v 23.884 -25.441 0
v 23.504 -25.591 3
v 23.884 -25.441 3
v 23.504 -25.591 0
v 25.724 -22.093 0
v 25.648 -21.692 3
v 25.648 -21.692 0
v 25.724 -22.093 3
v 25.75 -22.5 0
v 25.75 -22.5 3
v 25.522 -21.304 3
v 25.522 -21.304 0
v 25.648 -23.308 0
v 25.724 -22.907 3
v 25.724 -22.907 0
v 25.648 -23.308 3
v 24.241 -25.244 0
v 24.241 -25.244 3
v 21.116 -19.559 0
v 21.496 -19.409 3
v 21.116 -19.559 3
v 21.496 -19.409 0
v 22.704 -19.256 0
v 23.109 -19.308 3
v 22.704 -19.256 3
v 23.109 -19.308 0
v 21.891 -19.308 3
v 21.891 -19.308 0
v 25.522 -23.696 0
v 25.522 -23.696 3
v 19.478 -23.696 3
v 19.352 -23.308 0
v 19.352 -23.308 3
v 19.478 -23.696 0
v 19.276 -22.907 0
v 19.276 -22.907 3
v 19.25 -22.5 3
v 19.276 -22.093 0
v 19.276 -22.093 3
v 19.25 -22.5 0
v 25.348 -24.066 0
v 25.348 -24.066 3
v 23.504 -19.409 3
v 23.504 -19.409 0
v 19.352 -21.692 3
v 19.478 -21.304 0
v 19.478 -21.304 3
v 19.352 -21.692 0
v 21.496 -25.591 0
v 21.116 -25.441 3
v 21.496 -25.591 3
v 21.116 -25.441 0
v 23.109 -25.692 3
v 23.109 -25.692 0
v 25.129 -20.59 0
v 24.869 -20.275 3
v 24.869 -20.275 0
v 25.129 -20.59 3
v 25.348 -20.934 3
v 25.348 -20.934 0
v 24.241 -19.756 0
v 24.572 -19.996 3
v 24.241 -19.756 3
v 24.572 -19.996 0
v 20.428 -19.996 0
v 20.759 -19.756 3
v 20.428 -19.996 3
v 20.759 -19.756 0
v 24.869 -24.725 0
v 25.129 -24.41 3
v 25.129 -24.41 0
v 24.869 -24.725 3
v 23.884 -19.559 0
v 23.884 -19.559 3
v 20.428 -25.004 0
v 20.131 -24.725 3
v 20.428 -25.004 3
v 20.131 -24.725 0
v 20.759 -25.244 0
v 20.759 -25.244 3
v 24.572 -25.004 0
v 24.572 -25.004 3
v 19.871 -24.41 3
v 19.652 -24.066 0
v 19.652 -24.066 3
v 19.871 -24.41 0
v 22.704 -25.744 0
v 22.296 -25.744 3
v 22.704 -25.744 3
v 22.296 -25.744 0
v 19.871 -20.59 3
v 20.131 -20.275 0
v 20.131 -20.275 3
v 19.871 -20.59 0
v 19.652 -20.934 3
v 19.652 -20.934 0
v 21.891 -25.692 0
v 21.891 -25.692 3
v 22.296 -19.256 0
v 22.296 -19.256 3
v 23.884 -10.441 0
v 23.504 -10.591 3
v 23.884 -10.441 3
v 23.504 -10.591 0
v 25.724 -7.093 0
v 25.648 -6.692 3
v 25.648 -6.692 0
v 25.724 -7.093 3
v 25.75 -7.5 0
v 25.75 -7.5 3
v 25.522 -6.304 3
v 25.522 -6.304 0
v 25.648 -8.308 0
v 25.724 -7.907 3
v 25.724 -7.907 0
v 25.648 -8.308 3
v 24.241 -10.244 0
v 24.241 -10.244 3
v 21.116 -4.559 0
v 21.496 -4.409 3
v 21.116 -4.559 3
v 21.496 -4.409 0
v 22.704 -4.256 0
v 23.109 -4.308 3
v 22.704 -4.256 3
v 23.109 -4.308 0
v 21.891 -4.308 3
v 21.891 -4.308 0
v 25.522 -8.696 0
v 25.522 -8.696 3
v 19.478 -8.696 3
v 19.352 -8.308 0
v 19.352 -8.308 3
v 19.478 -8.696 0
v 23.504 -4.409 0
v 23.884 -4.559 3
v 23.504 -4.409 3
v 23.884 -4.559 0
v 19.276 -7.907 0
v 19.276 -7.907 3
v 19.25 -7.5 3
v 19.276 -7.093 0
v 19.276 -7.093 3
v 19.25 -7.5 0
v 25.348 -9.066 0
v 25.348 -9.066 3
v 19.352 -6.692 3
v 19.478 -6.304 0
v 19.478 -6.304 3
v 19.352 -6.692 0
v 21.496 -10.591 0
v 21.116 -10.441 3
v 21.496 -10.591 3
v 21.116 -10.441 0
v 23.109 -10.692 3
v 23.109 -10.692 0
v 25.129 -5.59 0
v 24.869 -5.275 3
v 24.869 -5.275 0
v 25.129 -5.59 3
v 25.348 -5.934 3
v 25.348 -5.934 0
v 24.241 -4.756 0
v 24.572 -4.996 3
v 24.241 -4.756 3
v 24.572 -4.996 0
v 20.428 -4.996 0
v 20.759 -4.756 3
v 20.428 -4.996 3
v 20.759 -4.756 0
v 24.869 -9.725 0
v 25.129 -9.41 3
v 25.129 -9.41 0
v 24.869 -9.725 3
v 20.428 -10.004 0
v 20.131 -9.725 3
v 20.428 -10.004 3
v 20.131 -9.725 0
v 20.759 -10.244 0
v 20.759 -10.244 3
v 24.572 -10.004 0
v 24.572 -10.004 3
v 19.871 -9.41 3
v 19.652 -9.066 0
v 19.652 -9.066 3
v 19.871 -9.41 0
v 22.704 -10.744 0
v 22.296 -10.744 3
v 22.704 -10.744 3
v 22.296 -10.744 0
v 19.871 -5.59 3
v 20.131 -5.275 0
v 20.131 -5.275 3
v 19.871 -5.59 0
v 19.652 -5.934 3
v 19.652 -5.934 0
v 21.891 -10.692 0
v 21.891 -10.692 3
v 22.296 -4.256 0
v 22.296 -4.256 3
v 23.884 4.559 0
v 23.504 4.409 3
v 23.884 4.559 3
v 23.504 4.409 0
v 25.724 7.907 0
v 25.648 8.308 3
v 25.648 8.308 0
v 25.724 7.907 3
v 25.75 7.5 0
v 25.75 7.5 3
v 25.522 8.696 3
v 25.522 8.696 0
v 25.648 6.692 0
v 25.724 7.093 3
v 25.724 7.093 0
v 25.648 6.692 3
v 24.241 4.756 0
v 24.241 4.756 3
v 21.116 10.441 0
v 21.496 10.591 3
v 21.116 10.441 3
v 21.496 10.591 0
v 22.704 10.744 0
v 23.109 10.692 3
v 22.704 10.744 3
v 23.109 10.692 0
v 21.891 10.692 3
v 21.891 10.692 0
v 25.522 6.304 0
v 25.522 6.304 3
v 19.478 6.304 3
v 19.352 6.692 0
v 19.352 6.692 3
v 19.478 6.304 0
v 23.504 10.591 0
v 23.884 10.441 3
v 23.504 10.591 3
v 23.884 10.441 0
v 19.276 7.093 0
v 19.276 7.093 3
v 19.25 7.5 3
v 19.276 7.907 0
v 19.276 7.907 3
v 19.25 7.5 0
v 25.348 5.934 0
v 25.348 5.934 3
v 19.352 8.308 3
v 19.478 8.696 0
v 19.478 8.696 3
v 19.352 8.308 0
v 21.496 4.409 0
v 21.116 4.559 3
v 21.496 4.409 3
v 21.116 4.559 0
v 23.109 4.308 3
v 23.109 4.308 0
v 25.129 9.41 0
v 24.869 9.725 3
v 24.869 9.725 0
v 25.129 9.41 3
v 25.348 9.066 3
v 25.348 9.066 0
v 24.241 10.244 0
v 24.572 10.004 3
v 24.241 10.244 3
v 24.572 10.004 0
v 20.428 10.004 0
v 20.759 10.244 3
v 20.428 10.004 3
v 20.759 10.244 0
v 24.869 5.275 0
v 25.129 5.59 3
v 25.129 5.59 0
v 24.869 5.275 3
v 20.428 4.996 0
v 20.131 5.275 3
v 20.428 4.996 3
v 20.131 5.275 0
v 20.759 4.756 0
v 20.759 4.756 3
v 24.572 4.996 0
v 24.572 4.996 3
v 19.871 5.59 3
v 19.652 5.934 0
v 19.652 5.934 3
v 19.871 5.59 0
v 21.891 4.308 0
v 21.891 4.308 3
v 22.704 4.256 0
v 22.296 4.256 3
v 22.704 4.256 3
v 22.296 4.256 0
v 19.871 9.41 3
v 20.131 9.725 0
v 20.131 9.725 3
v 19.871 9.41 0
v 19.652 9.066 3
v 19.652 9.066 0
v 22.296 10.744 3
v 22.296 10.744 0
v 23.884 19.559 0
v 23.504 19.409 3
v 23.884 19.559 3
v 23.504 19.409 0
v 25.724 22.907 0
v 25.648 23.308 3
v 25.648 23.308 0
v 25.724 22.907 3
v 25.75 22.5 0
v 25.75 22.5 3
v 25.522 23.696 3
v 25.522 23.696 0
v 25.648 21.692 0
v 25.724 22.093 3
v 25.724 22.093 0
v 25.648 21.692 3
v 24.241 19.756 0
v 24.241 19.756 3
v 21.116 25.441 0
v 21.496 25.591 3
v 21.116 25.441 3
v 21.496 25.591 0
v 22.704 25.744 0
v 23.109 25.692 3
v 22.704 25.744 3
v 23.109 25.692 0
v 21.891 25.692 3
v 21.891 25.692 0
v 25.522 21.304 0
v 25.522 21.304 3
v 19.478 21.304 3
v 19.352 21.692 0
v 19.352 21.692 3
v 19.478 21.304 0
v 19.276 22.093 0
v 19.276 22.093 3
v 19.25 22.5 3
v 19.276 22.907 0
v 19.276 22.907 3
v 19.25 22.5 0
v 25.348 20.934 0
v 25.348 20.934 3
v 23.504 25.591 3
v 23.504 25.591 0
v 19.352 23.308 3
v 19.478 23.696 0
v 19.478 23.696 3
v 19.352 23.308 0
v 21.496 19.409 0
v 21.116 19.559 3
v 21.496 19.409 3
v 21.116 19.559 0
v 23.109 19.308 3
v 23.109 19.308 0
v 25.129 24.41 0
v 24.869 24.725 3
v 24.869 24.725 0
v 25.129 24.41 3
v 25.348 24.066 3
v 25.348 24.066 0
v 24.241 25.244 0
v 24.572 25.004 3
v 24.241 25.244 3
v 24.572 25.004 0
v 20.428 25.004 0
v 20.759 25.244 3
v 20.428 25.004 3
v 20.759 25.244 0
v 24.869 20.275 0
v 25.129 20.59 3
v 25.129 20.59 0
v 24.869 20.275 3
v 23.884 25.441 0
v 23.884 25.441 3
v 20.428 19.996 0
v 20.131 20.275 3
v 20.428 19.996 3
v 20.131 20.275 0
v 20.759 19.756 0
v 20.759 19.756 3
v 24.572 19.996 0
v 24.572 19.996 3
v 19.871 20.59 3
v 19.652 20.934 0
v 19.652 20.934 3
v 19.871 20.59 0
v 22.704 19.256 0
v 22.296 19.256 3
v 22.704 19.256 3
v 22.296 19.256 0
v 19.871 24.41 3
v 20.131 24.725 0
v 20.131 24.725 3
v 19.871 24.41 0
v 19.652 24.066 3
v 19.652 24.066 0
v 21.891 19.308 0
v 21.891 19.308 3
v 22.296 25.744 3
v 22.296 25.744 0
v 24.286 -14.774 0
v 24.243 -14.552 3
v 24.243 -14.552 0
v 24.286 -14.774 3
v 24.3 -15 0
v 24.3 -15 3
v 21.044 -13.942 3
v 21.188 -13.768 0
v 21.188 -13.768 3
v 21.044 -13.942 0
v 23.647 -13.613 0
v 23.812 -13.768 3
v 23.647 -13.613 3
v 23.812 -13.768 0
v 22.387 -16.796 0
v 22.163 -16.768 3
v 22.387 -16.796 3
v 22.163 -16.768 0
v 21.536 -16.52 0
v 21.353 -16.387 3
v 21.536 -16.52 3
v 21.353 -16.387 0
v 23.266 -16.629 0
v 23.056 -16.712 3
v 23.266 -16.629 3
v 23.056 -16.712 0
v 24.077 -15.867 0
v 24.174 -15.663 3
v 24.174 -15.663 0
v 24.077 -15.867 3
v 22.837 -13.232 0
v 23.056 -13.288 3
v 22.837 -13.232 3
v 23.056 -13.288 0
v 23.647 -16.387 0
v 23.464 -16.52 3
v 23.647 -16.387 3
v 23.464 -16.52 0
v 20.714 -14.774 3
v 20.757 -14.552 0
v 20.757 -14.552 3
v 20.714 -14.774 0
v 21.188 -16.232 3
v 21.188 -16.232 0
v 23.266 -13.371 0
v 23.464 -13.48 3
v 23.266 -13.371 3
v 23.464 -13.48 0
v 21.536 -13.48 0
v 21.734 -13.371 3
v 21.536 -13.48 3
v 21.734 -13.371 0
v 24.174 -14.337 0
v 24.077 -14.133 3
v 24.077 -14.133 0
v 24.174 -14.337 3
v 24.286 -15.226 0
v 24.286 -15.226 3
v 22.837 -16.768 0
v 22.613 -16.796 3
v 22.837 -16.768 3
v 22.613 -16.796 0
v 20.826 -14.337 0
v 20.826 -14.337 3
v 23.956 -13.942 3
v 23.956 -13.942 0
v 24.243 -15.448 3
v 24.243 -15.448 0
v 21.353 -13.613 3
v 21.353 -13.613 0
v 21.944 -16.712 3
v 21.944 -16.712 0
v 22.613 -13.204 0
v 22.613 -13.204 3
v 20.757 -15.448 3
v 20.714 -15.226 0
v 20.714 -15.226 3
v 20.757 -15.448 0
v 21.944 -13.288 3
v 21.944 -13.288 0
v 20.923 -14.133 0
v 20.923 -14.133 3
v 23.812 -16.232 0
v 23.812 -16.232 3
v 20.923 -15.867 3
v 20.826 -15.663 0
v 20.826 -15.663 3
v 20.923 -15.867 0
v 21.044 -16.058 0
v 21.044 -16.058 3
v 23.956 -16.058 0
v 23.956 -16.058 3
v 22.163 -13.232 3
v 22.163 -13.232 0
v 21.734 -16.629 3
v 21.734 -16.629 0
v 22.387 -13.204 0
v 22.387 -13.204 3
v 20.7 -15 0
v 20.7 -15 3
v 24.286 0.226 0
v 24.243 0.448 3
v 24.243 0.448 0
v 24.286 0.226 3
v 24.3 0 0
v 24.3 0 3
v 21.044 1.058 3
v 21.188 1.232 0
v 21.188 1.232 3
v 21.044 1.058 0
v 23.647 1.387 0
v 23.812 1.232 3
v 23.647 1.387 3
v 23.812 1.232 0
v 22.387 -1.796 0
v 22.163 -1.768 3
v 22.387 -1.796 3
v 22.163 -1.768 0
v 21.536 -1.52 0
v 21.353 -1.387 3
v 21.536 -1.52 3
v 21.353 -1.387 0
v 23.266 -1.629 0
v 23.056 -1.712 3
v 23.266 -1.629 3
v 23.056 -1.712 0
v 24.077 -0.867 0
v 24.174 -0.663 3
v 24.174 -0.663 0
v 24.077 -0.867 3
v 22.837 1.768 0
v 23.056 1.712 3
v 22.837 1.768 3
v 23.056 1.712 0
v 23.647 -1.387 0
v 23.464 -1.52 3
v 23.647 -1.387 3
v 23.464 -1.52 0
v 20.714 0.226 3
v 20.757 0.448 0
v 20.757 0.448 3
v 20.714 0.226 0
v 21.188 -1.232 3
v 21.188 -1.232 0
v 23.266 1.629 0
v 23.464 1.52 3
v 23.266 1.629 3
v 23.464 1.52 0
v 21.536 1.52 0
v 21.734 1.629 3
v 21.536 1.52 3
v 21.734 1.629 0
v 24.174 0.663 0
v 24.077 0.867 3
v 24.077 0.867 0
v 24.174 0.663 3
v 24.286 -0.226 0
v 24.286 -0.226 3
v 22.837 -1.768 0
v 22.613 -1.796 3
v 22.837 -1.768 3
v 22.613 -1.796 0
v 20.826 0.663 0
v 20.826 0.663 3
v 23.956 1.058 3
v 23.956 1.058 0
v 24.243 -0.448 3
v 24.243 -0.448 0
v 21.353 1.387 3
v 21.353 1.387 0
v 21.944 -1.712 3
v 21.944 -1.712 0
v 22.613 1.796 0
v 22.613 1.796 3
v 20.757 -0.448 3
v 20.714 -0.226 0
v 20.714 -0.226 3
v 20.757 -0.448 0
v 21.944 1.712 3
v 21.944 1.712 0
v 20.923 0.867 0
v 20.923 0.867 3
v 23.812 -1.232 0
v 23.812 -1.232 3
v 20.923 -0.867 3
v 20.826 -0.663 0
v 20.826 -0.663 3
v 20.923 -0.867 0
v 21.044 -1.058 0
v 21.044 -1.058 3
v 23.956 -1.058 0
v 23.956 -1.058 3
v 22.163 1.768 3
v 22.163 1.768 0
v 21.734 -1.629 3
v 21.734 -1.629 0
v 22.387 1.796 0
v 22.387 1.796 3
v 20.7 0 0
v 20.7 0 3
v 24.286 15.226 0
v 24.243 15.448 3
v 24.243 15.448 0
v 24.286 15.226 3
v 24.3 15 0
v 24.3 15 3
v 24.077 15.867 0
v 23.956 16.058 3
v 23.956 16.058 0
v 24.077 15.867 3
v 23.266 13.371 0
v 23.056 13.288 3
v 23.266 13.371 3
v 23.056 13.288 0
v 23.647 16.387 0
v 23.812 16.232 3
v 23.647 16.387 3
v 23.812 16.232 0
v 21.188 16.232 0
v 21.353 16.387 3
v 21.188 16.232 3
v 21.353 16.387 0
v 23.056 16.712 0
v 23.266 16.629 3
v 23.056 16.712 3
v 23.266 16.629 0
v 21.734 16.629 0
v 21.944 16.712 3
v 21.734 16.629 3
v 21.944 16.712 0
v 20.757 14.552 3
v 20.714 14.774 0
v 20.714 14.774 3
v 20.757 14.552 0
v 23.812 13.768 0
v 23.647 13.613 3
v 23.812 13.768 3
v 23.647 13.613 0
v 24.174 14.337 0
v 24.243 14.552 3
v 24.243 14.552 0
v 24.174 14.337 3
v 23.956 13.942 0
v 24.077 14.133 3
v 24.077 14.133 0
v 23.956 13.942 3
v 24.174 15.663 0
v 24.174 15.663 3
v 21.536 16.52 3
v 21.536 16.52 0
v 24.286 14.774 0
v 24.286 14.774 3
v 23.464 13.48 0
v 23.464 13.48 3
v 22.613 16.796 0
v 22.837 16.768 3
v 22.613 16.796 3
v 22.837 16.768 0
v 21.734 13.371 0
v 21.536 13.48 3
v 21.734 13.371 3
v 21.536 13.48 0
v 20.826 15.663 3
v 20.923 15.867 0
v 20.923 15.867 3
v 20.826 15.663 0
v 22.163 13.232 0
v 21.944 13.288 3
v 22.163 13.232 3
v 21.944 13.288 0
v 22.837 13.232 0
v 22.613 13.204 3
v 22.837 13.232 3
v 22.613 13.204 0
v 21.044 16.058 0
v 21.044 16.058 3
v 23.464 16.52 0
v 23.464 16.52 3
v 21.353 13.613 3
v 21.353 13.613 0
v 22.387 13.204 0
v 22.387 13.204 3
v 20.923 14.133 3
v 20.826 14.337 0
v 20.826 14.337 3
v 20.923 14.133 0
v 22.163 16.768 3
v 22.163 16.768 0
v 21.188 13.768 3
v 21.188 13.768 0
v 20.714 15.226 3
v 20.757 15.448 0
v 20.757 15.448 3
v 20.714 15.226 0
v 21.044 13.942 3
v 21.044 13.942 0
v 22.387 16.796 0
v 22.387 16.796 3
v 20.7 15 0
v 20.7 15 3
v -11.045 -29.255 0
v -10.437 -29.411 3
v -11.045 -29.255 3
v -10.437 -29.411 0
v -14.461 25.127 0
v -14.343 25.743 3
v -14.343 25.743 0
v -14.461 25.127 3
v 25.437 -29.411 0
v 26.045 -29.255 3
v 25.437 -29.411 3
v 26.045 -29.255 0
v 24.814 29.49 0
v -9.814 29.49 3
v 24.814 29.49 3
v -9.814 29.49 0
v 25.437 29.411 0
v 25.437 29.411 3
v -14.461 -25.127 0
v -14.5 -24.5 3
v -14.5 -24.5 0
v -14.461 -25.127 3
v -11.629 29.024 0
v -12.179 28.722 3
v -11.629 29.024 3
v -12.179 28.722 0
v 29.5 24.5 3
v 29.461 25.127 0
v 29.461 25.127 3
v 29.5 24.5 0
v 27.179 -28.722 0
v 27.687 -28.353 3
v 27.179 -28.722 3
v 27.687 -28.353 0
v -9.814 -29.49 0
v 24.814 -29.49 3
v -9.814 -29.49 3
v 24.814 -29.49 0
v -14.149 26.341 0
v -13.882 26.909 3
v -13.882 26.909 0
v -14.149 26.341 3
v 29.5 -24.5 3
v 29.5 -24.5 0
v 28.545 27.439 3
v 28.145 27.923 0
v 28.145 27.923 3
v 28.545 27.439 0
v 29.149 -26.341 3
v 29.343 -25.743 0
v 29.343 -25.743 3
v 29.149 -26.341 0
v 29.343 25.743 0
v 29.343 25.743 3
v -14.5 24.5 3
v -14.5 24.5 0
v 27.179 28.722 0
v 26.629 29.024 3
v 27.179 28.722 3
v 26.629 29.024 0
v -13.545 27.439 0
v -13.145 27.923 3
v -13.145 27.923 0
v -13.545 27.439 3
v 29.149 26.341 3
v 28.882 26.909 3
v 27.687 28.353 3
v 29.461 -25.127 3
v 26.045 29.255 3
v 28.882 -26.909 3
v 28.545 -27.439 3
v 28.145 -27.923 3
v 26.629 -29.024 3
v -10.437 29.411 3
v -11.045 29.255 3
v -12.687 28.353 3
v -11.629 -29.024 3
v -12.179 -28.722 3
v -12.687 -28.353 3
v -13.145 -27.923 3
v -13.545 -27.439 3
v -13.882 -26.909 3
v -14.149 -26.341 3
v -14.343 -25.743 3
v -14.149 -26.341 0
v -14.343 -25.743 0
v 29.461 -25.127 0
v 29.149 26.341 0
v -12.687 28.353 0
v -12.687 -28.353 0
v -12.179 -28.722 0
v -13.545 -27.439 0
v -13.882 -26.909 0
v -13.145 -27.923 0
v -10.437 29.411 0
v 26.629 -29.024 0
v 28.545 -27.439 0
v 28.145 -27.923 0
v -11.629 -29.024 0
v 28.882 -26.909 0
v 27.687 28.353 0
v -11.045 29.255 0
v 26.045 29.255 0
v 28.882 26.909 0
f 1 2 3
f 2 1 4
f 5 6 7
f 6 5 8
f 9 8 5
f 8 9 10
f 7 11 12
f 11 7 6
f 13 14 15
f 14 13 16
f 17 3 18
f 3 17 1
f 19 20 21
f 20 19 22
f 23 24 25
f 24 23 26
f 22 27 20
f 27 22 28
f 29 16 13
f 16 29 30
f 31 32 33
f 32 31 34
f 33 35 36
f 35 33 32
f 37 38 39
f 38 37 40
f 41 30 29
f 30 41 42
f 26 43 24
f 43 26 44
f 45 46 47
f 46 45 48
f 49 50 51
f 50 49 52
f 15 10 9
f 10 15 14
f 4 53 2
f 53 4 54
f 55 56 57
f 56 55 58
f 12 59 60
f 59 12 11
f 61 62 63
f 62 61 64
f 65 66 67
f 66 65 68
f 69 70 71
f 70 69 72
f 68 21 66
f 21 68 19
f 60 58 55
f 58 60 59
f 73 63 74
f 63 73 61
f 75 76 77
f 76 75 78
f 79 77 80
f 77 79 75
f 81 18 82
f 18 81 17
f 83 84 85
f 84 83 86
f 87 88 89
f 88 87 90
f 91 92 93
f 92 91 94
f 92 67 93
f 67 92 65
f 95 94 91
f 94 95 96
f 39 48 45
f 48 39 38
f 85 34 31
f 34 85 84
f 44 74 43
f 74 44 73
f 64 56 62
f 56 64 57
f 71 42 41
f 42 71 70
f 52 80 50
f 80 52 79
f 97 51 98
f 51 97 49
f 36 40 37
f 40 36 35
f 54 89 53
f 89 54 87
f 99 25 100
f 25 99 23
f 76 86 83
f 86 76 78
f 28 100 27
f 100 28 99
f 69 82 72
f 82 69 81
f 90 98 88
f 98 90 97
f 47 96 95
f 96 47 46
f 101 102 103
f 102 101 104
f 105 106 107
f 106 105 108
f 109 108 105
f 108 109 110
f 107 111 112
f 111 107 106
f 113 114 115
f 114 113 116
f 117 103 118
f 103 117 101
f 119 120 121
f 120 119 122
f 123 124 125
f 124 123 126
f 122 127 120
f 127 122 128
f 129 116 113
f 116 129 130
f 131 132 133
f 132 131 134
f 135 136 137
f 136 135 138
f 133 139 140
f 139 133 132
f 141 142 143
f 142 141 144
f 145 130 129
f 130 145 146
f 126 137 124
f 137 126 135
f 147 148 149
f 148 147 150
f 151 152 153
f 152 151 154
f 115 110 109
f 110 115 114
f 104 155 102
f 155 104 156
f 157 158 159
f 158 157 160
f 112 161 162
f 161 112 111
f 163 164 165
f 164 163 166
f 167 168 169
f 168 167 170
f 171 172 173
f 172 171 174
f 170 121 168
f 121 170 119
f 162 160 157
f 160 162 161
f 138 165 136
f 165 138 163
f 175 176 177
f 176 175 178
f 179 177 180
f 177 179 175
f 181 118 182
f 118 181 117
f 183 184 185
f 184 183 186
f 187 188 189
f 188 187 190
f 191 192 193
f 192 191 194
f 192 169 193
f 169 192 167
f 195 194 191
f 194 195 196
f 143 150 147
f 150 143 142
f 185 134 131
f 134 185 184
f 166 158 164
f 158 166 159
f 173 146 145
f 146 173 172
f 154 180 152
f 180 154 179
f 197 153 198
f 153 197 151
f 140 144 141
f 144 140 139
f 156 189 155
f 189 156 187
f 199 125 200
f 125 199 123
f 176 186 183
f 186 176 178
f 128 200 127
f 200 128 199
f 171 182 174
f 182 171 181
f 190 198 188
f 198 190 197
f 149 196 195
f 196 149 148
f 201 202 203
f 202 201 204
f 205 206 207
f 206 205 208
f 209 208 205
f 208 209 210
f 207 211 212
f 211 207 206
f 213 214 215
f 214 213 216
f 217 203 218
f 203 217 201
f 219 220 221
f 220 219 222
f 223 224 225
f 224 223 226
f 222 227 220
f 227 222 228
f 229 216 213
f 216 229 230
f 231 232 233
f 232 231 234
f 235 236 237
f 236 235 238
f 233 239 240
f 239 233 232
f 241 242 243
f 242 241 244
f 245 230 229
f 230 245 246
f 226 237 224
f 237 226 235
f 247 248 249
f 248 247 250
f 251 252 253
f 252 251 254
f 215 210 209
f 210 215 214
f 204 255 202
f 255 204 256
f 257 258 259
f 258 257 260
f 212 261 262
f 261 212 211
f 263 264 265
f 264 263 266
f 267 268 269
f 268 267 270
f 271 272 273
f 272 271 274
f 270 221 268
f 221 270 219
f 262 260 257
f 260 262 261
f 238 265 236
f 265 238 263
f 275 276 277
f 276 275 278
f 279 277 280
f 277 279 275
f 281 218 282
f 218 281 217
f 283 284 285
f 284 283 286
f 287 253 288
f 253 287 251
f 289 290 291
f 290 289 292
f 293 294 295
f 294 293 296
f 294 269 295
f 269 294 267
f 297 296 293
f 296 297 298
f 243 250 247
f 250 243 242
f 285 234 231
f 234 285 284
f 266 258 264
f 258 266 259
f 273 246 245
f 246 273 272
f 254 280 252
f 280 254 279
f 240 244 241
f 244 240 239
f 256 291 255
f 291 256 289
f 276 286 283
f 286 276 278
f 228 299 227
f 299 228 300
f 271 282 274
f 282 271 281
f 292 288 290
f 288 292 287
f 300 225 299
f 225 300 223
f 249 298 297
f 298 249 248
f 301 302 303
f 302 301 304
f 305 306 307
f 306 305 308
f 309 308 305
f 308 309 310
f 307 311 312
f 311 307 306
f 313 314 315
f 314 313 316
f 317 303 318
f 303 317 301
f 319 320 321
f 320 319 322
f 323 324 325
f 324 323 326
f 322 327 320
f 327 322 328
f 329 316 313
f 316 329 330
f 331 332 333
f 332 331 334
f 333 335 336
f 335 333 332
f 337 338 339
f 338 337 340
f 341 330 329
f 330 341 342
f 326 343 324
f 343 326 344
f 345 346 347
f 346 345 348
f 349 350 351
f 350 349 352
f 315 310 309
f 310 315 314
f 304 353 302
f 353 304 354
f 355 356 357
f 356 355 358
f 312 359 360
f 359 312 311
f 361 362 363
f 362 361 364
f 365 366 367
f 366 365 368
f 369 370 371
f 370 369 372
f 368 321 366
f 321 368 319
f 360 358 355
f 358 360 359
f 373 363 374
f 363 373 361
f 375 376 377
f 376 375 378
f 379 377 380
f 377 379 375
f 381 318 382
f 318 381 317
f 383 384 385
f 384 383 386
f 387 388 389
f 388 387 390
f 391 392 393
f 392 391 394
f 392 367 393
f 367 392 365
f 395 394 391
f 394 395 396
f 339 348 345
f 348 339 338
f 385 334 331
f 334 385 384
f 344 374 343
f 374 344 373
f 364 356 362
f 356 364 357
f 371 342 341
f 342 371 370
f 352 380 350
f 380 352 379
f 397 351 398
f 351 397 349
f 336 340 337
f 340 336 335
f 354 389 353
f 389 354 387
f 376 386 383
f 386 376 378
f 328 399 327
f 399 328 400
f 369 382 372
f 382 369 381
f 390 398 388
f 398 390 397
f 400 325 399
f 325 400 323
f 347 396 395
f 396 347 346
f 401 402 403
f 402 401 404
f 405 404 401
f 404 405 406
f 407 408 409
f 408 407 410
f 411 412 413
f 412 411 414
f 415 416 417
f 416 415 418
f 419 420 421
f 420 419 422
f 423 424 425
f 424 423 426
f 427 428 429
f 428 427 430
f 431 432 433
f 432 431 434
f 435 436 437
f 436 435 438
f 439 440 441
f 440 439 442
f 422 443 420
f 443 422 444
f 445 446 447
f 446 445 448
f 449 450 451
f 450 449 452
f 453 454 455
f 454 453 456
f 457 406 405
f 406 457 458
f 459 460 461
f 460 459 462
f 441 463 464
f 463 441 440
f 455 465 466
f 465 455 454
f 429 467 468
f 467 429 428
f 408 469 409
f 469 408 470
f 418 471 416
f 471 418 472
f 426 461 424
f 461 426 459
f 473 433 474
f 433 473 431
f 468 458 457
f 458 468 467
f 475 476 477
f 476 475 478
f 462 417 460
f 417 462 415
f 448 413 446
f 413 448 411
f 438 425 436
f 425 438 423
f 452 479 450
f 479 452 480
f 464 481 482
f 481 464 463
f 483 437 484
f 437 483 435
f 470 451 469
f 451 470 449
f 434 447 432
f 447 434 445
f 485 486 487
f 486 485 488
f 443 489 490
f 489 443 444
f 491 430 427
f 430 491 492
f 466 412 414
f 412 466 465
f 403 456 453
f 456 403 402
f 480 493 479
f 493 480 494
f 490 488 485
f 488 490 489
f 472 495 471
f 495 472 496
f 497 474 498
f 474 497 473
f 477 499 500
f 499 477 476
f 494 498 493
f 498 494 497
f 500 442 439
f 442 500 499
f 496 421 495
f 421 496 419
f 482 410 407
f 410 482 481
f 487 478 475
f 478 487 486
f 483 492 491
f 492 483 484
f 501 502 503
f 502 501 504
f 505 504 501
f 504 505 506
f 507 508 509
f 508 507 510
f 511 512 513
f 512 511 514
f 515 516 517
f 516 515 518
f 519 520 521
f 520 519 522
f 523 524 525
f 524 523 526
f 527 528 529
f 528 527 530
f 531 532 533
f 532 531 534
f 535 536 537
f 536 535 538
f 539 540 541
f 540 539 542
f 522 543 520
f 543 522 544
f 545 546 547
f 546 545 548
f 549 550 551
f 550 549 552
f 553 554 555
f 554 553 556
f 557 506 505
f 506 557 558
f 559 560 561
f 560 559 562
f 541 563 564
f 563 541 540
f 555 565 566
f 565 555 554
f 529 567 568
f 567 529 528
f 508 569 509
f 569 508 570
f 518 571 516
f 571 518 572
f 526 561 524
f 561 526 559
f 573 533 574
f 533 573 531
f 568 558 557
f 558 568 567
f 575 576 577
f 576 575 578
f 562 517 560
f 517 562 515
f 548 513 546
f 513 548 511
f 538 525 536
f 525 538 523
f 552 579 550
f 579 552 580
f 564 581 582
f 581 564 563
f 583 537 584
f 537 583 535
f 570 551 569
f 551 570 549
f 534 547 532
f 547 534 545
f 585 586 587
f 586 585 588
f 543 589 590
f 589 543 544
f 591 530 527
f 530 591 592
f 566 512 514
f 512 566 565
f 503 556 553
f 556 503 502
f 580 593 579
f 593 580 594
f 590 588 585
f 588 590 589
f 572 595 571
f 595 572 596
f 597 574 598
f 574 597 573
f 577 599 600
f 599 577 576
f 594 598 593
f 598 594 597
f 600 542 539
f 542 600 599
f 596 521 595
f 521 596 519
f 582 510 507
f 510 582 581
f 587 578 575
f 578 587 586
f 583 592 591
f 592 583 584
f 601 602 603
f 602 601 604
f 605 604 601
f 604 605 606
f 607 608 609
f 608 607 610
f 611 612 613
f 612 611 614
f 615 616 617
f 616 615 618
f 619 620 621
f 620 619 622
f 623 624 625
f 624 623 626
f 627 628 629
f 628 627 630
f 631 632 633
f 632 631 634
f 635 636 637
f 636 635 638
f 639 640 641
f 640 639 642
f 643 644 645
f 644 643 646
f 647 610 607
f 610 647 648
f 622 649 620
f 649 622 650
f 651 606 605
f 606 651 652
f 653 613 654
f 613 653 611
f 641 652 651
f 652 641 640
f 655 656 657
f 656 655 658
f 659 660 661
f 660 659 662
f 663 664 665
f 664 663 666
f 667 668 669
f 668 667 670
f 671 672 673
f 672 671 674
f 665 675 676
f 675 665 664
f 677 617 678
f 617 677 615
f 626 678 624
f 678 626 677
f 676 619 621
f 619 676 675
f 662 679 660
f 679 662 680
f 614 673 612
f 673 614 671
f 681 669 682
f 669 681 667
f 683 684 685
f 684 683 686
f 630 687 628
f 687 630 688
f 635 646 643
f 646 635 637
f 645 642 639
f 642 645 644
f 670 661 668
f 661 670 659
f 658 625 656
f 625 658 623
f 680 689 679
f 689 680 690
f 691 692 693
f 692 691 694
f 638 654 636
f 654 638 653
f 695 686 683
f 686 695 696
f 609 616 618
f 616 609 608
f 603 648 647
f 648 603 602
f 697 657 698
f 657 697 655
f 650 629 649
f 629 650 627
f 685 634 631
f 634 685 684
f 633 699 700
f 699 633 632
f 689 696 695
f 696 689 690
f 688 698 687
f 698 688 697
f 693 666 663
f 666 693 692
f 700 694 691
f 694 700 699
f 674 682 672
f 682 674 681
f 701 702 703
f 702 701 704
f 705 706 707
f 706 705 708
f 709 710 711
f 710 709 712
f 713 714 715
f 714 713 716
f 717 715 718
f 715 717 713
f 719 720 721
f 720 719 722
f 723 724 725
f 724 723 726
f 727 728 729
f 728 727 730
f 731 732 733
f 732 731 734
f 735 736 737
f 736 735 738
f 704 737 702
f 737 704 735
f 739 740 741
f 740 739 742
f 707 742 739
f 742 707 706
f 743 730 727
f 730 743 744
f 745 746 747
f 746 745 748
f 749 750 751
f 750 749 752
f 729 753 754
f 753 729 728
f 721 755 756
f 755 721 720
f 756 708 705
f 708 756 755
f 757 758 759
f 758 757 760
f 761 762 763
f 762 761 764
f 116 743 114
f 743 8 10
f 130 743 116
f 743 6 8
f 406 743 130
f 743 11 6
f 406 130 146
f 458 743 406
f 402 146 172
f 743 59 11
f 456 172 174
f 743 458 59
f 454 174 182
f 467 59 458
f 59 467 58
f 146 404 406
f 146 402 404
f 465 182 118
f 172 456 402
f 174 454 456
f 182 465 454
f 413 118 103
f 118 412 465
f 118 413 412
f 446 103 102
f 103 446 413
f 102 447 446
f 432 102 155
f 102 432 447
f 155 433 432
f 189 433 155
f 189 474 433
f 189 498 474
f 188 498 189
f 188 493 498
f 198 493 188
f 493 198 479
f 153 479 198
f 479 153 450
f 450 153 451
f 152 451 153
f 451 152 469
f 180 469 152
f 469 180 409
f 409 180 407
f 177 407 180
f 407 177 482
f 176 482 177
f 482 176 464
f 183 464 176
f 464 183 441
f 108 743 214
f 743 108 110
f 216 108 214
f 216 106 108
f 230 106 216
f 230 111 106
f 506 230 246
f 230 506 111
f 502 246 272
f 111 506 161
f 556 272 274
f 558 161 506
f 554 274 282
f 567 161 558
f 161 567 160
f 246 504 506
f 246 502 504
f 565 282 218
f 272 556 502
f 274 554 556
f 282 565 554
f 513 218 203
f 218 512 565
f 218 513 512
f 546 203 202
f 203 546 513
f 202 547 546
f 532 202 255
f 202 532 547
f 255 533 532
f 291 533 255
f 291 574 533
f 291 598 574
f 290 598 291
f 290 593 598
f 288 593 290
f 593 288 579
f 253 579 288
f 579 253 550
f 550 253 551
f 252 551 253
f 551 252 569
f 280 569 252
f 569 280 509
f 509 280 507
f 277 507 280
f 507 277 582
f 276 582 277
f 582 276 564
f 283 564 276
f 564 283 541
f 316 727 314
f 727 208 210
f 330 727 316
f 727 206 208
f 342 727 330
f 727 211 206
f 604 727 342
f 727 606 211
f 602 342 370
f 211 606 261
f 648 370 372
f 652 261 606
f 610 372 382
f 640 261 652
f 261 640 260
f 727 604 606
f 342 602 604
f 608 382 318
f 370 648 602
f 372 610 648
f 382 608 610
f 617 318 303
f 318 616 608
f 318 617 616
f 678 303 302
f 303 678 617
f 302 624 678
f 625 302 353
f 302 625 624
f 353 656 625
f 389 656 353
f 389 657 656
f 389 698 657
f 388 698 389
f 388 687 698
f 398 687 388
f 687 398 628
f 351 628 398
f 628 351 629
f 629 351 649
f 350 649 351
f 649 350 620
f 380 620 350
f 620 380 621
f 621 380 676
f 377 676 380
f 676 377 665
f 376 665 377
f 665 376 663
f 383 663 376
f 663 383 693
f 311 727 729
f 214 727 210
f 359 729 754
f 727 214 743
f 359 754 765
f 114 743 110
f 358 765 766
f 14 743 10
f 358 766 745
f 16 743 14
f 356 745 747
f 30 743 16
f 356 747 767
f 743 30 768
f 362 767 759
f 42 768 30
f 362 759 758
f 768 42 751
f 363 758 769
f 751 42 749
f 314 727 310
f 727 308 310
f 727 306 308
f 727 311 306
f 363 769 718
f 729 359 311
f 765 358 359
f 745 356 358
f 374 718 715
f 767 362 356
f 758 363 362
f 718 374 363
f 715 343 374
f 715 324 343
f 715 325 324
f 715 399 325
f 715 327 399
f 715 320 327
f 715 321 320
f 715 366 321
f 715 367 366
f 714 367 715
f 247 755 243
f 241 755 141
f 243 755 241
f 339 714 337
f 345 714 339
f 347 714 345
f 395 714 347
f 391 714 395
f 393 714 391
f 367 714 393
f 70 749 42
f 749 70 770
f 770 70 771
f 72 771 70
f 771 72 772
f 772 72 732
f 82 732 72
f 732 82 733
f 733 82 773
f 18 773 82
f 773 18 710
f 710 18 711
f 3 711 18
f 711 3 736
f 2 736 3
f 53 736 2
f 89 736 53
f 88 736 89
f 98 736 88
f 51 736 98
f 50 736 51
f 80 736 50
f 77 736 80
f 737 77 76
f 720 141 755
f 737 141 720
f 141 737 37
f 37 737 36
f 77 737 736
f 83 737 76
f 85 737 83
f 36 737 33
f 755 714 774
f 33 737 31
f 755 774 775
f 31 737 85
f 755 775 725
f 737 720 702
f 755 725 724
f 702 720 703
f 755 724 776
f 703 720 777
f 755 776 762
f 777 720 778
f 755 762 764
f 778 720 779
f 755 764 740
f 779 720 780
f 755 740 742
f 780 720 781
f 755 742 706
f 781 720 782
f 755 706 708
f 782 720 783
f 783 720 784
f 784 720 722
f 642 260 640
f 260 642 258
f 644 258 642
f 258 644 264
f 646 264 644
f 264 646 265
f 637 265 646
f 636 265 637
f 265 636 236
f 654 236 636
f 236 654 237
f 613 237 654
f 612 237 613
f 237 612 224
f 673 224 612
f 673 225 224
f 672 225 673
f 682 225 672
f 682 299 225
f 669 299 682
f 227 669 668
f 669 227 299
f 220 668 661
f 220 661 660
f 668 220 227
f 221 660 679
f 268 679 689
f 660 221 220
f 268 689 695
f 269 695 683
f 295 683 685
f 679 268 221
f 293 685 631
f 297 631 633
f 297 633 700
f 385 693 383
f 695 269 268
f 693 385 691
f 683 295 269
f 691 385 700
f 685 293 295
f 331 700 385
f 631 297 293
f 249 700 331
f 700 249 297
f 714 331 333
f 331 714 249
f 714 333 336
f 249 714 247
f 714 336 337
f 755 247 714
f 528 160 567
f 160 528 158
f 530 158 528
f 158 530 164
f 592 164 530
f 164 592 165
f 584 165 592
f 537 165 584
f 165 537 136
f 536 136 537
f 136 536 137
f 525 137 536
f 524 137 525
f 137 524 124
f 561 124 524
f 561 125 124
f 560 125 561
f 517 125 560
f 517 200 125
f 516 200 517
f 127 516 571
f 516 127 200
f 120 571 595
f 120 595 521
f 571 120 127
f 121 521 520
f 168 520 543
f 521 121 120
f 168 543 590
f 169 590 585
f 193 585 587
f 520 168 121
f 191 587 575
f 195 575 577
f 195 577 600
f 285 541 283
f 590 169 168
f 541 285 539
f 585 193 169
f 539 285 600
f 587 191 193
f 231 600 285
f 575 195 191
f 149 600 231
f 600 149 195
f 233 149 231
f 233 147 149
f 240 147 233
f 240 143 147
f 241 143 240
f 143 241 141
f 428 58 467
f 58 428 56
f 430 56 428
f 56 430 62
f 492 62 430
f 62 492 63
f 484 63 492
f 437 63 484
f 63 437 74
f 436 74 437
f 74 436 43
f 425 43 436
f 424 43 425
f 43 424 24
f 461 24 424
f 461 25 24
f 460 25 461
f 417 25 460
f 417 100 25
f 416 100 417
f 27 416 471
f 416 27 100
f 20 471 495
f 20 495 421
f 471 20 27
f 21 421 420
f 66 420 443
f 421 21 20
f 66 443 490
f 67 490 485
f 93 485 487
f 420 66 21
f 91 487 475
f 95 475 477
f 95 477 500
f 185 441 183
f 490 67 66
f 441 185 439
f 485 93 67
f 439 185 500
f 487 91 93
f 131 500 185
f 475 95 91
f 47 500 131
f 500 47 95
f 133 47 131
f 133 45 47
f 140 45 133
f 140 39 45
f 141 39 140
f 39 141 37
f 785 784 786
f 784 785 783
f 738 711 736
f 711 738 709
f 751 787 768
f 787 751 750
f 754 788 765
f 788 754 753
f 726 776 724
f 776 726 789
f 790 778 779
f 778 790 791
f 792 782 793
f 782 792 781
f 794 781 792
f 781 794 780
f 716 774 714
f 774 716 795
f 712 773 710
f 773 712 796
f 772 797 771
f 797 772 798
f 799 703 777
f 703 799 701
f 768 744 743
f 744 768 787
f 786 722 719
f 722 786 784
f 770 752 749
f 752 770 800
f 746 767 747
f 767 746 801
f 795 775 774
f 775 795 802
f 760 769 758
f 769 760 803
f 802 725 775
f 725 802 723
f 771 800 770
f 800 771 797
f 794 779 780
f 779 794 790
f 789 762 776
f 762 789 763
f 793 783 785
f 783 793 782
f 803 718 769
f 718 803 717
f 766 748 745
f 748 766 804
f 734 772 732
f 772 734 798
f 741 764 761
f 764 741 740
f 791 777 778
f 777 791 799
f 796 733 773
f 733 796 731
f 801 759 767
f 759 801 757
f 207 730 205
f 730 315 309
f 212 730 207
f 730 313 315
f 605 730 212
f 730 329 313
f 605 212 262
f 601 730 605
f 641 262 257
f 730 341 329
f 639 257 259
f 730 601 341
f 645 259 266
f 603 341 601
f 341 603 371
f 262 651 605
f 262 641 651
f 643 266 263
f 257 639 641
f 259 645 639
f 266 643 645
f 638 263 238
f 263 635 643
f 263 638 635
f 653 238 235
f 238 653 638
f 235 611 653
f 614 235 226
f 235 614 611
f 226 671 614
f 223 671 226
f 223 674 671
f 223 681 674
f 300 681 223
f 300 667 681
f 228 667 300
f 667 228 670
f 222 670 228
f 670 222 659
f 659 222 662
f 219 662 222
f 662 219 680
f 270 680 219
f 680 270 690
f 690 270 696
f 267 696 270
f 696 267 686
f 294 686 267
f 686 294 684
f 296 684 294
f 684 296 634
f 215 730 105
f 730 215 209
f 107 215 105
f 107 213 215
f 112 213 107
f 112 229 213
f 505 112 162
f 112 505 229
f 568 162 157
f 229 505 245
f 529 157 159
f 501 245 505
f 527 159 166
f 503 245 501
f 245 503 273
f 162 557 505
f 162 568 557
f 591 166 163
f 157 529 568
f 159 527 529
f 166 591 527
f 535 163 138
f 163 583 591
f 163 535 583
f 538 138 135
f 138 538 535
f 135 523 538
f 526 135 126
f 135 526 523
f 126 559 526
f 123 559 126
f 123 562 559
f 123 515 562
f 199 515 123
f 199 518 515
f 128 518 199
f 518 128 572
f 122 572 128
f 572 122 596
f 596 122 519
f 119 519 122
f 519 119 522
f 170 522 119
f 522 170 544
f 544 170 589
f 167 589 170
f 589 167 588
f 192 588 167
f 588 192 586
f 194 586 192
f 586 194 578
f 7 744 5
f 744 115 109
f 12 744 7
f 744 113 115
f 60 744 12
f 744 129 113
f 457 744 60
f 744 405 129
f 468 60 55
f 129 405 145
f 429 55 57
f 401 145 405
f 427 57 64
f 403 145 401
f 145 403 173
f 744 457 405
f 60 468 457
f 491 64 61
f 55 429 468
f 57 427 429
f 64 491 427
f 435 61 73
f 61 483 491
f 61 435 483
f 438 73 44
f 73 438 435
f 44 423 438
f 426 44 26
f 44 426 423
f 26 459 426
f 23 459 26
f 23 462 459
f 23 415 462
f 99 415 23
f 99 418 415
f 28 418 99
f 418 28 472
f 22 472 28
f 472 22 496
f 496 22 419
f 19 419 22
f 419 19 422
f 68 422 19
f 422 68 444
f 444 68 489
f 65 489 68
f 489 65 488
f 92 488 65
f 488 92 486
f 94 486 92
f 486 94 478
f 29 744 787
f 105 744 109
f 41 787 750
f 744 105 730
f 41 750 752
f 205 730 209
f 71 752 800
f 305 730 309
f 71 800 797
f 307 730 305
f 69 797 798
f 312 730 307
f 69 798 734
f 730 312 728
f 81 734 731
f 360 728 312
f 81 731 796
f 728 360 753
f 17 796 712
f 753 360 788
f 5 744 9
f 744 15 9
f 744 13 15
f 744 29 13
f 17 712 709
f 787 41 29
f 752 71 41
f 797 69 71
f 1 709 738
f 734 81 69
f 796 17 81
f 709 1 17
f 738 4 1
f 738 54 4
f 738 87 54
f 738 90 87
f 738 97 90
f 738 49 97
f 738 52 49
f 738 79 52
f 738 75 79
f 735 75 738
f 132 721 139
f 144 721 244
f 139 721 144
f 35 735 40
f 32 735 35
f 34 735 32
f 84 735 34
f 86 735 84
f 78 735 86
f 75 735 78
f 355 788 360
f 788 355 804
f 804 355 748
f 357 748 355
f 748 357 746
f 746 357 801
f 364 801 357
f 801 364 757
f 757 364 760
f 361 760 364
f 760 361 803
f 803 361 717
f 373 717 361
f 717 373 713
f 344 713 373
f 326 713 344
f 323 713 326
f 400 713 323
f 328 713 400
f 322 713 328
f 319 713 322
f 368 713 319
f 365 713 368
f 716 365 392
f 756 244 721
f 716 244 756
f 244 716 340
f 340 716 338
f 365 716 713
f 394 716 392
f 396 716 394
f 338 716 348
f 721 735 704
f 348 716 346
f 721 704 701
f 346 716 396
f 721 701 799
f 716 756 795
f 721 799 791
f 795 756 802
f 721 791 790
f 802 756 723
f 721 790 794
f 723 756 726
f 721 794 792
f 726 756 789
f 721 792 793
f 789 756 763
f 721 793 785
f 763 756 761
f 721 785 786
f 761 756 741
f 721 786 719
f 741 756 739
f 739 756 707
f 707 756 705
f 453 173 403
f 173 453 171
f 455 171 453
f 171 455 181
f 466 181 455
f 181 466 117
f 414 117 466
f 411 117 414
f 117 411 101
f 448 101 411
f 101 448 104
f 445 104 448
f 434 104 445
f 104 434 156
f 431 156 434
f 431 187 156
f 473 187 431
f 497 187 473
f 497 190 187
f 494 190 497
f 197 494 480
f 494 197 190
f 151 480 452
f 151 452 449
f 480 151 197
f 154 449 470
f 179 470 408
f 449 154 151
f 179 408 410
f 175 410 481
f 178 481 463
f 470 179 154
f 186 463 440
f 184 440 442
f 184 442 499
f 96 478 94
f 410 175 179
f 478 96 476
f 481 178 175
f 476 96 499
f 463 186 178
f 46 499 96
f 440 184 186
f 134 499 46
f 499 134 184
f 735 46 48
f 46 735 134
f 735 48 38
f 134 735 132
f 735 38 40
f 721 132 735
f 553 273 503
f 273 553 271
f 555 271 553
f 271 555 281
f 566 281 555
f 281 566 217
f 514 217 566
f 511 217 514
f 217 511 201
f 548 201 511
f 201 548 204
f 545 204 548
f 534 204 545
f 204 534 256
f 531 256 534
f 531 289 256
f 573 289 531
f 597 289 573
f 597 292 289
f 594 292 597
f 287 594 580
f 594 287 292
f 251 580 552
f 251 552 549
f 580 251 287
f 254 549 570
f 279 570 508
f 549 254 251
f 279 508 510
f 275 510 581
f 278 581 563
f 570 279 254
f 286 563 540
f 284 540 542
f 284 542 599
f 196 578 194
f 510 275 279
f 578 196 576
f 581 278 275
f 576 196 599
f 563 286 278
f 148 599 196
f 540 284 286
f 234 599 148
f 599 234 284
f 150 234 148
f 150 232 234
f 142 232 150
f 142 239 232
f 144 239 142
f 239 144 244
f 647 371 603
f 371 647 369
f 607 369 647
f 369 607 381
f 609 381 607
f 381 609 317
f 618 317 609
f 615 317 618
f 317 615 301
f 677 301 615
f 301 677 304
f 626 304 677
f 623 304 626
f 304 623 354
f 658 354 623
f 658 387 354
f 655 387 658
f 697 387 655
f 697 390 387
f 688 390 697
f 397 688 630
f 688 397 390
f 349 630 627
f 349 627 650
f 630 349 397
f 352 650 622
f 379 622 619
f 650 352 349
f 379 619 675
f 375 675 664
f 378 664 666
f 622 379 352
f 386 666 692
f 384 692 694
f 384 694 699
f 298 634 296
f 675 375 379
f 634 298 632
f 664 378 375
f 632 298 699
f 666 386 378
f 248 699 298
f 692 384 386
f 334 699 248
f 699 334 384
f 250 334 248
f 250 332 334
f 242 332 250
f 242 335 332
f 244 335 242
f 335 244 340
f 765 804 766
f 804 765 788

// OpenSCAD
$fn = 50;

difference() {
	union() {
		translate(v = [7.5, 0.0, 0]) {
			hull() {
				translate(v = [-17.0, 24.5, 0]) {
					cylinder(h = 3, r = 5);
				}
				translate(v = [17.0, 24.5, 0]) {
					cylinder(h = 3, r = 5);
				}
				translate(v = [-17.0, -24.5, 0]) {
					cylinder(h = 3, r = 5);
				}
				translate(v = [17.0, -24.5, 0]) {
					cylinder(h = 3, r = 5);
				}
			}
		}
	}
	union() {
		translate(v = [22.5, -22.5, -1]) {
			cylinder(h = 5, r = 3.25);
		}
		translate(v = [22.5, -7.5, -1]) {
			cylinder(h = 5, r = 3.25);
		}
		translate(v = [22.5, 7.5, -1]) {
			cylinder(h = 5, r = 3.25);
		}
		translate(v = [22.5, 22.5, -1]) {
			cylinder(h = 5, r = 3.25);
		}
		translate(v = [22.5, -15.0, -1]) {
			cylinder(h = 5, r = 1.8);
		}
		translate(v = [22.5, 0.0, -1]) {
			cylinder(h = 5, r = 1.8);
		}
		translate(v = [22.5, 15.0, -1]) {
			cylinder(h = 5, r = 1.8);
		}
	}
}
